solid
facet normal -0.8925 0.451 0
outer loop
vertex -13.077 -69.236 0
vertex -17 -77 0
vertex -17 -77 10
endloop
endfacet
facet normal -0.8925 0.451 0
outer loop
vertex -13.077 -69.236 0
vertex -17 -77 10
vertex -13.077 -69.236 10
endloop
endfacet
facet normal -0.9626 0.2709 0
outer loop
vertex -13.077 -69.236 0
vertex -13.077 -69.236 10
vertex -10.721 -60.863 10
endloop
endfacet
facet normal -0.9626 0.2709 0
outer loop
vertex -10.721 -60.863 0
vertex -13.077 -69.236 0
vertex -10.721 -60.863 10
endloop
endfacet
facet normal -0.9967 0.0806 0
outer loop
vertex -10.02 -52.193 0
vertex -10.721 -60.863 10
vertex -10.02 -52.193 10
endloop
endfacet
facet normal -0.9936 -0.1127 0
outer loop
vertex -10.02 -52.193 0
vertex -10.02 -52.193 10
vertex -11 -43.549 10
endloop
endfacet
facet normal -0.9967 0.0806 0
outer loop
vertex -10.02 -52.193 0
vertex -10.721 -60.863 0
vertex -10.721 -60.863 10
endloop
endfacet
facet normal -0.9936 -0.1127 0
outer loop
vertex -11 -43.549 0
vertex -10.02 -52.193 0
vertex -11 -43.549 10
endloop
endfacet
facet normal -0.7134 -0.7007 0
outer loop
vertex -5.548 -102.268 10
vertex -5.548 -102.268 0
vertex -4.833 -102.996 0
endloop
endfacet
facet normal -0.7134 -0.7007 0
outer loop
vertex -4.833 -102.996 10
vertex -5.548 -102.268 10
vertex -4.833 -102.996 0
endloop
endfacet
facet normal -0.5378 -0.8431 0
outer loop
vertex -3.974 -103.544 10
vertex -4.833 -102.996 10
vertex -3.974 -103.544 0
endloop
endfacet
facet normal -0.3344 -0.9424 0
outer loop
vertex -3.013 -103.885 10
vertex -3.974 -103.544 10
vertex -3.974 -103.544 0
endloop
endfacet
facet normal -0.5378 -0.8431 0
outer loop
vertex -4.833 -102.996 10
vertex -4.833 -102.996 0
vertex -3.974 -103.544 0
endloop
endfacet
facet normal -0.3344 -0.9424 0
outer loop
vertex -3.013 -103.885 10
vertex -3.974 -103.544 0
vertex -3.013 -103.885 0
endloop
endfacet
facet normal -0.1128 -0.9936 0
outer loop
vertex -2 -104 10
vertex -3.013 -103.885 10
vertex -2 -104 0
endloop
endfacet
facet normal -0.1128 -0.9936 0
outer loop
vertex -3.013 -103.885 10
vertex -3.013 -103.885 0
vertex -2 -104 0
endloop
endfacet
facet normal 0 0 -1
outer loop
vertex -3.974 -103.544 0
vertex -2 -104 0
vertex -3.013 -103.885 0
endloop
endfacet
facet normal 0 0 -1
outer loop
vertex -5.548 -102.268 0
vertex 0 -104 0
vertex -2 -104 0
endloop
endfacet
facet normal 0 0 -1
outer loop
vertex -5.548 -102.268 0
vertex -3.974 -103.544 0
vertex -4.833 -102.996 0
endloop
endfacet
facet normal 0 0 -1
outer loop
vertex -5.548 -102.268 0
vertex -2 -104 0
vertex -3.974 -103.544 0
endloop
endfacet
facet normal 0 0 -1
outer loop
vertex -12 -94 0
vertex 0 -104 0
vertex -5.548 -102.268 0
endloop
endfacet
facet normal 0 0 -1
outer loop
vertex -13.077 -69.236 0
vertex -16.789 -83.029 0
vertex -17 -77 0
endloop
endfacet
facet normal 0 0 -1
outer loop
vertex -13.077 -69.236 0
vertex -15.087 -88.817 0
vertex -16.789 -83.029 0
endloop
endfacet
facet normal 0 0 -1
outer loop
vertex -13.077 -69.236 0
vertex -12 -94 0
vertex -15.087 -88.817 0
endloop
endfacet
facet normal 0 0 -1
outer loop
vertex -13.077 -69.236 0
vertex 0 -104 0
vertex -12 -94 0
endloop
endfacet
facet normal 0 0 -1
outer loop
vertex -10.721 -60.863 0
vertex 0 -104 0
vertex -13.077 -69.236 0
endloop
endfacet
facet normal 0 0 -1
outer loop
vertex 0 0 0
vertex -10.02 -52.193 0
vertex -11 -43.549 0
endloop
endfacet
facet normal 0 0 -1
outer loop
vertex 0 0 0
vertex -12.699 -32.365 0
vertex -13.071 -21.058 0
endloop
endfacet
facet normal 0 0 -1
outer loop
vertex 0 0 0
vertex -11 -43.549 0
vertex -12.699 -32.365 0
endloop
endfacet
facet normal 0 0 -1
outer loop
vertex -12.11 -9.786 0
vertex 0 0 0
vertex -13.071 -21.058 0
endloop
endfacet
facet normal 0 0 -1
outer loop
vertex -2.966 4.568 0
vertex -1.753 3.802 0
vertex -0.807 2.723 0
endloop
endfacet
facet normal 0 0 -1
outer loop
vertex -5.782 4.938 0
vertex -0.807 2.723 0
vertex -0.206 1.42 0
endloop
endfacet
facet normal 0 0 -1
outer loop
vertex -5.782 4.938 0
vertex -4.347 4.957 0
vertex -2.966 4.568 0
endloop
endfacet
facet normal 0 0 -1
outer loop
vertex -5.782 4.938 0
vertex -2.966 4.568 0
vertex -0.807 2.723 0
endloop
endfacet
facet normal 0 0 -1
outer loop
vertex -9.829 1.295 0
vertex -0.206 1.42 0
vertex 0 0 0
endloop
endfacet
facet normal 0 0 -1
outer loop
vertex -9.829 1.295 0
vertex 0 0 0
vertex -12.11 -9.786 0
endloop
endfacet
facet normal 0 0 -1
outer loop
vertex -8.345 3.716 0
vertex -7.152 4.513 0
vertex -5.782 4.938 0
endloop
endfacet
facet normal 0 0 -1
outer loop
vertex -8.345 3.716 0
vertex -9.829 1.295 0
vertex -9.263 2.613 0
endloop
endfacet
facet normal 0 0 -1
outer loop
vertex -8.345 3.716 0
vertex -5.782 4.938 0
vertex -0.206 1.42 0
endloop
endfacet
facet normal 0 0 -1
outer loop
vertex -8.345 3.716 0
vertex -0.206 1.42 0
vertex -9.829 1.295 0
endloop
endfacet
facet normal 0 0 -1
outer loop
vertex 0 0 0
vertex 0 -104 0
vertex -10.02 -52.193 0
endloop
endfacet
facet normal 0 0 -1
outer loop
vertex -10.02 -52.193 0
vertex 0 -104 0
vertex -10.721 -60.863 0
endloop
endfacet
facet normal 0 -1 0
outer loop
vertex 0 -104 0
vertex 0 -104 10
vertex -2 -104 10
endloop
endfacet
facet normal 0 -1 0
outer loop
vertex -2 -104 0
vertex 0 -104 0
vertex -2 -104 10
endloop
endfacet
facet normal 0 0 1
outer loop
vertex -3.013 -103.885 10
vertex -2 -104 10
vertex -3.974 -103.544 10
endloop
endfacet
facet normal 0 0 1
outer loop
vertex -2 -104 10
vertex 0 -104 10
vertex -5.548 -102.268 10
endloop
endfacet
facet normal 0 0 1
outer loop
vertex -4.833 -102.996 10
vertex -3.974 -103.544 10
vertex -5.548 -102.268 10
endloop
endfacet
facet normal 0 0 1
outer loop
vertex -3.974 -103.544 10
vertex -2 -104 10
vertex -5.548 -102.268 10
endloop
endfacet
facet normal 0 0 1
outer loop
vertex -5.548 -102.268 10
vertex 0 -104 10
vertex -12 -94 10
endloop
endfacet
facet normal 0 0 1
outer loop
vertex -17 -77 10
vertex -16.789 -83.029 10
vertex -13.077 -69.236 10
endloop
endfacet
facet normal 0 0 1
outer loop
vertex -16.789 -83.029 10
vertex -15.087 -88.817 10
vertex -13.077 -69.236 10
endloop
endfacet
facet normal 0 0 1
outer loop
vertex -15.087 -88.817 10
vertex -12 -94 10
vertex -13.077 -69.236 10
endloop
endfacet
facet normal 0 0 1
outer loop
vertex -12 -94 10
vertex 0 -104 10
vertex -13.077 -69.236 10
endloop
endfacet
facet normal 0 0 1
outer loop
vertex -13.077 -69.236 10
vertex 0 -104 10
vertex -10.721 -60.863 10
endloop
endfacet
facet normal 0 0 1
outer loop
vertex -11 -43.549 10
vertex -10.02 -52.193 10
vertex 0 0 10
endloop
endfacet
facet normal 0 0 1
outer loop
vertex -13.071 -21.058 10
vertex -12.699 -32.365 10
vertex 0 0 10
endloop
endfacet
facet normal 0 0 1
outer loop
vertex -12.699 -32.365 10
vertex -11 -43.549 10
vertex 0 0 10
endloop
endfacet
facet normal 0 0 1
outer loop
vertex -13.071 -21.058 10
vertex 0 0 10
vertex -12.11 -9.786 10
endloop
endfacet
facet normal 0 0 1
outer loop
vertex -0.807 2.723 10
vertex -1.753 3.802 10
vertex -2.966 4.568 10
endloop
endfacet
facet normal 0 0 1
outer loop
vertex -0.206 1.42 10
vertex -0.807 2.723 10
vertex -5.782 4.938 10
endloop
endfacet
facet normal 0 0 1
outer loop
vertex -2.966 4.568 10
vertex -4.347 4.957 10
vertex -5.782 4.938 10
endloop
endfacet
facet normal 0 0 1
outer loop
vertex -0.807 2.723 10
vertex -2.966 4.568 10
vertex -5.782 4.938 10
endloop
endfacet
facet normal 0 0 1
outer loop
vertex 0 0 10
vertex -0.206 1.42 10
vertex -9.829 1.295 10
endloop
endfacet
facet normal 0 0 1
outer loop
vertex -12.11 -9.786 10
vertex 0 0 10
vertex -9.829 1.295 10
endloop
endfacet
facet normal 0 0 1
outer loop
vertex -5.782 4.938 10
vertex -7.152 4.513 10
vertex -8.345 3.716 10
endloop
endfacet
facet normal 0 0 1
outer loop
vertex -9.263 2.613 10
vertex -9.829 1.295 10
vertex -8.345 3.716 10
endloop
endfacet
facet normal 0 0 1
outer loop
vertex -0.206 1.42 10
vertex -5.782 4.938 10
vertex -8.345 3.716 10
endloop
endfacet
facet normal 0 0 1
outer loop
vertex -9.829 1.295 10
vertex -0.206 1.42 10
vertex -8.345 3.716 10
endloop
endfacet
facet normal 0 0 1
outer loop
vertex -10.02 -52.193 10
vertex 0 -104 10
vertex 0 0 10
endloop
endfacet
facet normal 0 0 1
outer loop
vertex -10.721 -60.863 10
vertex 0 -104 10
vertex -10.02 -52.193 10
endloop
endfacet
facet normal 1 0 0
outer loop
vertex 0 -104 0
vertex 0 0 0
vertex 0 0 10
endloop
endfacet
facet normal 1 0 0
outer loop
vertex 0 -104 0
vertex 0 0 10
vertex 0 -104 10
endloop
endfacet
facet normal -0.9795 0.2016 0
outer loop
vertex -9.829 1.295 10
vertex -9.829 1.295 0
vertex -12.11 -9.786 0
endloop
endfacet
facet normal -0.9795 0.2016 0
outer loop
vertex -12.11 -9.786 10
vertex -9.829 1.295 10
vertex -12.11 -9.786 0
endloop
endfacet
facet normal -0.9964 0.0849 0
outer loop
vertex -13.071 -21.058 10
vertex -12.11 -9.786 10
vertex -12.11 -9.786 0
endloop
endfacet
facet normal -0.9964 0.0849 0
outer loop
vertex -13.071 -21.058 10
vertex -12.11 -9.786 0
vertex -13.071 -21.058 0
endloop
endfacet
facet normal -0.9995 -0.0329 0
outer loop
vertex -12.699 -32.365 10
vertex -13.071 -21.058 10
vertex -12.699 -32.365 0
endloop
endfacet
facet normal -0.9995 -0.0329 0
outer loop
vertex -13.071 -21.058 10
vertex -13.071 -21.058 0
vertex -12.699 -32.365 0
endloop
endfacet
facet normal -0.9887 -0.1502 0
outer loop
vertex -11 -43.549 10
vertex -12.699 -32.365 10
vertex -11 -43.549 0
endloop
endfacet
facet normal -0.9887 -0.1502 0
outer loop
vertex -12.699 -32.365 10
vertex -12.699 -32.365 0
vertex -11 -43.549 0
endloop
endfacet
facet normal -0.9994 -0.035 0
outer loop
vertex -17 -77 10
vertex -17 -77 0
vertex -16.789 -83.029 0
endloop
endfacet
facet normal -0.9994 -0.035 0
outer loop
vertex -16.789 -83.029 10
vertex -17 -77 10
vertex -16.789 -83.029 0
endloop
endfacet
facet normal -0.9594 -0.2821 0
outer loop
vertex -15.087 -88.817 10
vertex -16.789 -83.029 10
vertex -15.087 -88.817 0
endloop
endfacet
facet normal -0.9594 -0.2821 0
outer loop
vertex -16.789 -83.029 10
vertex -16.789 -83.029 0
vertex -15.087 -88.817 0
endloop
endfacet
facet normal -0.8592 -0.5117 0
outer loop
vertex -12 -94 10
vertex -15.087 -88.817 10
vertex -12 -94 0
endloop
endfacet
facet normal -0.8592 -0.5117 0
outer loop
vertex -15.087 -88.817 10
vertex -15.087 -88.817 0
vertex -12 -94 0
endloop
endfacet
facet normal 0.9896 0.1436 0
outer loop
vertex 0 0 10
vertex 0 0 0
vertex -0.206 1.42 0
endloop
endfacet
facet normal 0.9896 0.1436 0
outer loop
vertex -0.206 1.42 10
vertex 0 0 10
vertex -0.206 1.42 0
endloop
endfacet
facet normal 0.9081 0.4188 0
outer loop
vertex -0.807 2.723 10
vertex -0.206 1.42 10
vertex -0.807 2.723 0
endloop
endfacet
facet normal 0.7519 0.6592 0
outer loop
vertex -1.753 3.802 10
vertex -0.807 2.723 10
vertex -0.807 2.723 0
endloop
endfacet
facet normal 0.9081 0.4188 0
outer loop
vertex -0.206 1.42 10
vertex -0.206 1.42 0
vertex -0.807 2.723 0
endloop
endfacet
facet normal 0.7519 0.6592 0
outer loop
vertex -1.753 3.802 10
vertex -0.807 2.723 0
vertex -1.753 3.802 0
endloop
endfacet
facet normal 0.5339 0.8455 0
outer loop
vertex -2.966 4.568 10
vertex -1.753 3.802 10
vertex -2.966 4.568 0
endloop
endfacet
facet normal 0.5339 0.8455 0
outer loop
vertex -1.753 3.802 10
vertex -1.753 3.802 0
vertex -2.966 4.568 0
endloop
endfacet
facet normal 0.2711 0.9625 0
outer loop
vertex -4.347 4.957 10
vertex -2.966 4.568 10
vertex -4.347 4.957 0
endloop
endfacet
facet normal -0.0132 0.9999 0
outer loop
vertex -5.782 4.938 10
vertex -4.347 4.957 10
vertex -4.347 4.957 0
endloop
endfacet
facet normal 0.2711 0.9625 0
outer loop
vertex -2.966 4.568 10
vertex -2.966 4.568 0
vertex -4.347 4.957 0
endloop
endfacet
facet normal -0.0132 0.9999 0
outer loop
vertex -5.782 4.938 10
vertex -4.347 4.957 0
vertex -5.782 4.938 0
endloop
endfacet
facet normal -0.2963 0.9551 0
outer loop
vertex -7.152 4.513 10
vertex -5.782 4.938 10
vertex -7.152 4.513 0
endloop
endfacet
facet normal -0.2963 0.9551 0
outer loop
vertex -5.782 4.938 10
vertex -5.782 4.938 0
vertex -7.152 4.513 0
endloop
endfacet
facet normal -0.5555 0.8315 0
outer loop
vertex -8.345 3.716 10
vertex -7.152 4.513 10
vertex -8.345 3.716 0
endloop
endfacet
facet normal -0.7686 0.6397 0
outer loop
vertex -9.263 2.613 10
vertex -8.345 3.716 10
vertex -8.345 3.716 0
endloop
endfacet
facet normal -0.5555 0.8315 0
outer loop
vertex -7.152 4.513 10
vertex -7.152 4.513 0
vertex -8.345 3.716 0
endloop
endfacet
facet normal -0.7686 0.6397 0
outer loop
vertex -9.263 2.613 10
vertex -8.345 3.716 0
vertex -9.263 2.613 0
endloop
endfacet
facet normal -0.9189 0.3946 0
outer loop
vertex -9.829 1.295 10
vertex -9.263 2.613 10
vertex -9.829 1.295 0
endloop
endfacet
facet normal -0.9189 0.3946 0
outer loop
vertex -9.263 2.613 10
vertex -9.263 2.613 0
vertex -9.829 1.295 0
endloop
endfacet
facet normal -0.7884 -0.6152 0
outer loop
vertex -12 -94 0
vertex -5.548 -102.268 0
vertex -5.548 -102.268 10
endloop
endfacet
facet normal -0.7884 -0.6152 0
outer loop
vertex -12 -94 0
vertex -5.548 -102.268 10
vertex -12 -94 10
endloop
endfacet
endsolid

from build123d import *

# Parameters (mm, degrees)
PAD_DEPTH = 10


with BuildPart() as part:
    # Sketch → Pad (new body)
    with BuildSketch(Plane.XY):
        with BuildLine():
            Line((0, 0), (0, -104))
            Line((0, -104), (-2, -104))
            ThreePointArc((-5.547641, -102.268437), (-3.973833, -103.544006), (-2, -104))
            Line((-5.547641, -102.268437), (-12, -94))
            ThreePointArc((-17, -77), (-16.119734, -85.976392), (-12, -94))
            ThreePointArc((-17, -77), (-10.720846, -60.862897), (-11, -43.549436))
            ThreePointArc((-9.829475, 1.29467), (-13.070868, -21.058052), (-11, -43.549436))
            ThreePointArc((0, 0), (-4.347074, 4.957185), (-9.829475, 1.29467))
        make_face()
    extrude(amount=PAD_DEPTH)


solid = part.part
